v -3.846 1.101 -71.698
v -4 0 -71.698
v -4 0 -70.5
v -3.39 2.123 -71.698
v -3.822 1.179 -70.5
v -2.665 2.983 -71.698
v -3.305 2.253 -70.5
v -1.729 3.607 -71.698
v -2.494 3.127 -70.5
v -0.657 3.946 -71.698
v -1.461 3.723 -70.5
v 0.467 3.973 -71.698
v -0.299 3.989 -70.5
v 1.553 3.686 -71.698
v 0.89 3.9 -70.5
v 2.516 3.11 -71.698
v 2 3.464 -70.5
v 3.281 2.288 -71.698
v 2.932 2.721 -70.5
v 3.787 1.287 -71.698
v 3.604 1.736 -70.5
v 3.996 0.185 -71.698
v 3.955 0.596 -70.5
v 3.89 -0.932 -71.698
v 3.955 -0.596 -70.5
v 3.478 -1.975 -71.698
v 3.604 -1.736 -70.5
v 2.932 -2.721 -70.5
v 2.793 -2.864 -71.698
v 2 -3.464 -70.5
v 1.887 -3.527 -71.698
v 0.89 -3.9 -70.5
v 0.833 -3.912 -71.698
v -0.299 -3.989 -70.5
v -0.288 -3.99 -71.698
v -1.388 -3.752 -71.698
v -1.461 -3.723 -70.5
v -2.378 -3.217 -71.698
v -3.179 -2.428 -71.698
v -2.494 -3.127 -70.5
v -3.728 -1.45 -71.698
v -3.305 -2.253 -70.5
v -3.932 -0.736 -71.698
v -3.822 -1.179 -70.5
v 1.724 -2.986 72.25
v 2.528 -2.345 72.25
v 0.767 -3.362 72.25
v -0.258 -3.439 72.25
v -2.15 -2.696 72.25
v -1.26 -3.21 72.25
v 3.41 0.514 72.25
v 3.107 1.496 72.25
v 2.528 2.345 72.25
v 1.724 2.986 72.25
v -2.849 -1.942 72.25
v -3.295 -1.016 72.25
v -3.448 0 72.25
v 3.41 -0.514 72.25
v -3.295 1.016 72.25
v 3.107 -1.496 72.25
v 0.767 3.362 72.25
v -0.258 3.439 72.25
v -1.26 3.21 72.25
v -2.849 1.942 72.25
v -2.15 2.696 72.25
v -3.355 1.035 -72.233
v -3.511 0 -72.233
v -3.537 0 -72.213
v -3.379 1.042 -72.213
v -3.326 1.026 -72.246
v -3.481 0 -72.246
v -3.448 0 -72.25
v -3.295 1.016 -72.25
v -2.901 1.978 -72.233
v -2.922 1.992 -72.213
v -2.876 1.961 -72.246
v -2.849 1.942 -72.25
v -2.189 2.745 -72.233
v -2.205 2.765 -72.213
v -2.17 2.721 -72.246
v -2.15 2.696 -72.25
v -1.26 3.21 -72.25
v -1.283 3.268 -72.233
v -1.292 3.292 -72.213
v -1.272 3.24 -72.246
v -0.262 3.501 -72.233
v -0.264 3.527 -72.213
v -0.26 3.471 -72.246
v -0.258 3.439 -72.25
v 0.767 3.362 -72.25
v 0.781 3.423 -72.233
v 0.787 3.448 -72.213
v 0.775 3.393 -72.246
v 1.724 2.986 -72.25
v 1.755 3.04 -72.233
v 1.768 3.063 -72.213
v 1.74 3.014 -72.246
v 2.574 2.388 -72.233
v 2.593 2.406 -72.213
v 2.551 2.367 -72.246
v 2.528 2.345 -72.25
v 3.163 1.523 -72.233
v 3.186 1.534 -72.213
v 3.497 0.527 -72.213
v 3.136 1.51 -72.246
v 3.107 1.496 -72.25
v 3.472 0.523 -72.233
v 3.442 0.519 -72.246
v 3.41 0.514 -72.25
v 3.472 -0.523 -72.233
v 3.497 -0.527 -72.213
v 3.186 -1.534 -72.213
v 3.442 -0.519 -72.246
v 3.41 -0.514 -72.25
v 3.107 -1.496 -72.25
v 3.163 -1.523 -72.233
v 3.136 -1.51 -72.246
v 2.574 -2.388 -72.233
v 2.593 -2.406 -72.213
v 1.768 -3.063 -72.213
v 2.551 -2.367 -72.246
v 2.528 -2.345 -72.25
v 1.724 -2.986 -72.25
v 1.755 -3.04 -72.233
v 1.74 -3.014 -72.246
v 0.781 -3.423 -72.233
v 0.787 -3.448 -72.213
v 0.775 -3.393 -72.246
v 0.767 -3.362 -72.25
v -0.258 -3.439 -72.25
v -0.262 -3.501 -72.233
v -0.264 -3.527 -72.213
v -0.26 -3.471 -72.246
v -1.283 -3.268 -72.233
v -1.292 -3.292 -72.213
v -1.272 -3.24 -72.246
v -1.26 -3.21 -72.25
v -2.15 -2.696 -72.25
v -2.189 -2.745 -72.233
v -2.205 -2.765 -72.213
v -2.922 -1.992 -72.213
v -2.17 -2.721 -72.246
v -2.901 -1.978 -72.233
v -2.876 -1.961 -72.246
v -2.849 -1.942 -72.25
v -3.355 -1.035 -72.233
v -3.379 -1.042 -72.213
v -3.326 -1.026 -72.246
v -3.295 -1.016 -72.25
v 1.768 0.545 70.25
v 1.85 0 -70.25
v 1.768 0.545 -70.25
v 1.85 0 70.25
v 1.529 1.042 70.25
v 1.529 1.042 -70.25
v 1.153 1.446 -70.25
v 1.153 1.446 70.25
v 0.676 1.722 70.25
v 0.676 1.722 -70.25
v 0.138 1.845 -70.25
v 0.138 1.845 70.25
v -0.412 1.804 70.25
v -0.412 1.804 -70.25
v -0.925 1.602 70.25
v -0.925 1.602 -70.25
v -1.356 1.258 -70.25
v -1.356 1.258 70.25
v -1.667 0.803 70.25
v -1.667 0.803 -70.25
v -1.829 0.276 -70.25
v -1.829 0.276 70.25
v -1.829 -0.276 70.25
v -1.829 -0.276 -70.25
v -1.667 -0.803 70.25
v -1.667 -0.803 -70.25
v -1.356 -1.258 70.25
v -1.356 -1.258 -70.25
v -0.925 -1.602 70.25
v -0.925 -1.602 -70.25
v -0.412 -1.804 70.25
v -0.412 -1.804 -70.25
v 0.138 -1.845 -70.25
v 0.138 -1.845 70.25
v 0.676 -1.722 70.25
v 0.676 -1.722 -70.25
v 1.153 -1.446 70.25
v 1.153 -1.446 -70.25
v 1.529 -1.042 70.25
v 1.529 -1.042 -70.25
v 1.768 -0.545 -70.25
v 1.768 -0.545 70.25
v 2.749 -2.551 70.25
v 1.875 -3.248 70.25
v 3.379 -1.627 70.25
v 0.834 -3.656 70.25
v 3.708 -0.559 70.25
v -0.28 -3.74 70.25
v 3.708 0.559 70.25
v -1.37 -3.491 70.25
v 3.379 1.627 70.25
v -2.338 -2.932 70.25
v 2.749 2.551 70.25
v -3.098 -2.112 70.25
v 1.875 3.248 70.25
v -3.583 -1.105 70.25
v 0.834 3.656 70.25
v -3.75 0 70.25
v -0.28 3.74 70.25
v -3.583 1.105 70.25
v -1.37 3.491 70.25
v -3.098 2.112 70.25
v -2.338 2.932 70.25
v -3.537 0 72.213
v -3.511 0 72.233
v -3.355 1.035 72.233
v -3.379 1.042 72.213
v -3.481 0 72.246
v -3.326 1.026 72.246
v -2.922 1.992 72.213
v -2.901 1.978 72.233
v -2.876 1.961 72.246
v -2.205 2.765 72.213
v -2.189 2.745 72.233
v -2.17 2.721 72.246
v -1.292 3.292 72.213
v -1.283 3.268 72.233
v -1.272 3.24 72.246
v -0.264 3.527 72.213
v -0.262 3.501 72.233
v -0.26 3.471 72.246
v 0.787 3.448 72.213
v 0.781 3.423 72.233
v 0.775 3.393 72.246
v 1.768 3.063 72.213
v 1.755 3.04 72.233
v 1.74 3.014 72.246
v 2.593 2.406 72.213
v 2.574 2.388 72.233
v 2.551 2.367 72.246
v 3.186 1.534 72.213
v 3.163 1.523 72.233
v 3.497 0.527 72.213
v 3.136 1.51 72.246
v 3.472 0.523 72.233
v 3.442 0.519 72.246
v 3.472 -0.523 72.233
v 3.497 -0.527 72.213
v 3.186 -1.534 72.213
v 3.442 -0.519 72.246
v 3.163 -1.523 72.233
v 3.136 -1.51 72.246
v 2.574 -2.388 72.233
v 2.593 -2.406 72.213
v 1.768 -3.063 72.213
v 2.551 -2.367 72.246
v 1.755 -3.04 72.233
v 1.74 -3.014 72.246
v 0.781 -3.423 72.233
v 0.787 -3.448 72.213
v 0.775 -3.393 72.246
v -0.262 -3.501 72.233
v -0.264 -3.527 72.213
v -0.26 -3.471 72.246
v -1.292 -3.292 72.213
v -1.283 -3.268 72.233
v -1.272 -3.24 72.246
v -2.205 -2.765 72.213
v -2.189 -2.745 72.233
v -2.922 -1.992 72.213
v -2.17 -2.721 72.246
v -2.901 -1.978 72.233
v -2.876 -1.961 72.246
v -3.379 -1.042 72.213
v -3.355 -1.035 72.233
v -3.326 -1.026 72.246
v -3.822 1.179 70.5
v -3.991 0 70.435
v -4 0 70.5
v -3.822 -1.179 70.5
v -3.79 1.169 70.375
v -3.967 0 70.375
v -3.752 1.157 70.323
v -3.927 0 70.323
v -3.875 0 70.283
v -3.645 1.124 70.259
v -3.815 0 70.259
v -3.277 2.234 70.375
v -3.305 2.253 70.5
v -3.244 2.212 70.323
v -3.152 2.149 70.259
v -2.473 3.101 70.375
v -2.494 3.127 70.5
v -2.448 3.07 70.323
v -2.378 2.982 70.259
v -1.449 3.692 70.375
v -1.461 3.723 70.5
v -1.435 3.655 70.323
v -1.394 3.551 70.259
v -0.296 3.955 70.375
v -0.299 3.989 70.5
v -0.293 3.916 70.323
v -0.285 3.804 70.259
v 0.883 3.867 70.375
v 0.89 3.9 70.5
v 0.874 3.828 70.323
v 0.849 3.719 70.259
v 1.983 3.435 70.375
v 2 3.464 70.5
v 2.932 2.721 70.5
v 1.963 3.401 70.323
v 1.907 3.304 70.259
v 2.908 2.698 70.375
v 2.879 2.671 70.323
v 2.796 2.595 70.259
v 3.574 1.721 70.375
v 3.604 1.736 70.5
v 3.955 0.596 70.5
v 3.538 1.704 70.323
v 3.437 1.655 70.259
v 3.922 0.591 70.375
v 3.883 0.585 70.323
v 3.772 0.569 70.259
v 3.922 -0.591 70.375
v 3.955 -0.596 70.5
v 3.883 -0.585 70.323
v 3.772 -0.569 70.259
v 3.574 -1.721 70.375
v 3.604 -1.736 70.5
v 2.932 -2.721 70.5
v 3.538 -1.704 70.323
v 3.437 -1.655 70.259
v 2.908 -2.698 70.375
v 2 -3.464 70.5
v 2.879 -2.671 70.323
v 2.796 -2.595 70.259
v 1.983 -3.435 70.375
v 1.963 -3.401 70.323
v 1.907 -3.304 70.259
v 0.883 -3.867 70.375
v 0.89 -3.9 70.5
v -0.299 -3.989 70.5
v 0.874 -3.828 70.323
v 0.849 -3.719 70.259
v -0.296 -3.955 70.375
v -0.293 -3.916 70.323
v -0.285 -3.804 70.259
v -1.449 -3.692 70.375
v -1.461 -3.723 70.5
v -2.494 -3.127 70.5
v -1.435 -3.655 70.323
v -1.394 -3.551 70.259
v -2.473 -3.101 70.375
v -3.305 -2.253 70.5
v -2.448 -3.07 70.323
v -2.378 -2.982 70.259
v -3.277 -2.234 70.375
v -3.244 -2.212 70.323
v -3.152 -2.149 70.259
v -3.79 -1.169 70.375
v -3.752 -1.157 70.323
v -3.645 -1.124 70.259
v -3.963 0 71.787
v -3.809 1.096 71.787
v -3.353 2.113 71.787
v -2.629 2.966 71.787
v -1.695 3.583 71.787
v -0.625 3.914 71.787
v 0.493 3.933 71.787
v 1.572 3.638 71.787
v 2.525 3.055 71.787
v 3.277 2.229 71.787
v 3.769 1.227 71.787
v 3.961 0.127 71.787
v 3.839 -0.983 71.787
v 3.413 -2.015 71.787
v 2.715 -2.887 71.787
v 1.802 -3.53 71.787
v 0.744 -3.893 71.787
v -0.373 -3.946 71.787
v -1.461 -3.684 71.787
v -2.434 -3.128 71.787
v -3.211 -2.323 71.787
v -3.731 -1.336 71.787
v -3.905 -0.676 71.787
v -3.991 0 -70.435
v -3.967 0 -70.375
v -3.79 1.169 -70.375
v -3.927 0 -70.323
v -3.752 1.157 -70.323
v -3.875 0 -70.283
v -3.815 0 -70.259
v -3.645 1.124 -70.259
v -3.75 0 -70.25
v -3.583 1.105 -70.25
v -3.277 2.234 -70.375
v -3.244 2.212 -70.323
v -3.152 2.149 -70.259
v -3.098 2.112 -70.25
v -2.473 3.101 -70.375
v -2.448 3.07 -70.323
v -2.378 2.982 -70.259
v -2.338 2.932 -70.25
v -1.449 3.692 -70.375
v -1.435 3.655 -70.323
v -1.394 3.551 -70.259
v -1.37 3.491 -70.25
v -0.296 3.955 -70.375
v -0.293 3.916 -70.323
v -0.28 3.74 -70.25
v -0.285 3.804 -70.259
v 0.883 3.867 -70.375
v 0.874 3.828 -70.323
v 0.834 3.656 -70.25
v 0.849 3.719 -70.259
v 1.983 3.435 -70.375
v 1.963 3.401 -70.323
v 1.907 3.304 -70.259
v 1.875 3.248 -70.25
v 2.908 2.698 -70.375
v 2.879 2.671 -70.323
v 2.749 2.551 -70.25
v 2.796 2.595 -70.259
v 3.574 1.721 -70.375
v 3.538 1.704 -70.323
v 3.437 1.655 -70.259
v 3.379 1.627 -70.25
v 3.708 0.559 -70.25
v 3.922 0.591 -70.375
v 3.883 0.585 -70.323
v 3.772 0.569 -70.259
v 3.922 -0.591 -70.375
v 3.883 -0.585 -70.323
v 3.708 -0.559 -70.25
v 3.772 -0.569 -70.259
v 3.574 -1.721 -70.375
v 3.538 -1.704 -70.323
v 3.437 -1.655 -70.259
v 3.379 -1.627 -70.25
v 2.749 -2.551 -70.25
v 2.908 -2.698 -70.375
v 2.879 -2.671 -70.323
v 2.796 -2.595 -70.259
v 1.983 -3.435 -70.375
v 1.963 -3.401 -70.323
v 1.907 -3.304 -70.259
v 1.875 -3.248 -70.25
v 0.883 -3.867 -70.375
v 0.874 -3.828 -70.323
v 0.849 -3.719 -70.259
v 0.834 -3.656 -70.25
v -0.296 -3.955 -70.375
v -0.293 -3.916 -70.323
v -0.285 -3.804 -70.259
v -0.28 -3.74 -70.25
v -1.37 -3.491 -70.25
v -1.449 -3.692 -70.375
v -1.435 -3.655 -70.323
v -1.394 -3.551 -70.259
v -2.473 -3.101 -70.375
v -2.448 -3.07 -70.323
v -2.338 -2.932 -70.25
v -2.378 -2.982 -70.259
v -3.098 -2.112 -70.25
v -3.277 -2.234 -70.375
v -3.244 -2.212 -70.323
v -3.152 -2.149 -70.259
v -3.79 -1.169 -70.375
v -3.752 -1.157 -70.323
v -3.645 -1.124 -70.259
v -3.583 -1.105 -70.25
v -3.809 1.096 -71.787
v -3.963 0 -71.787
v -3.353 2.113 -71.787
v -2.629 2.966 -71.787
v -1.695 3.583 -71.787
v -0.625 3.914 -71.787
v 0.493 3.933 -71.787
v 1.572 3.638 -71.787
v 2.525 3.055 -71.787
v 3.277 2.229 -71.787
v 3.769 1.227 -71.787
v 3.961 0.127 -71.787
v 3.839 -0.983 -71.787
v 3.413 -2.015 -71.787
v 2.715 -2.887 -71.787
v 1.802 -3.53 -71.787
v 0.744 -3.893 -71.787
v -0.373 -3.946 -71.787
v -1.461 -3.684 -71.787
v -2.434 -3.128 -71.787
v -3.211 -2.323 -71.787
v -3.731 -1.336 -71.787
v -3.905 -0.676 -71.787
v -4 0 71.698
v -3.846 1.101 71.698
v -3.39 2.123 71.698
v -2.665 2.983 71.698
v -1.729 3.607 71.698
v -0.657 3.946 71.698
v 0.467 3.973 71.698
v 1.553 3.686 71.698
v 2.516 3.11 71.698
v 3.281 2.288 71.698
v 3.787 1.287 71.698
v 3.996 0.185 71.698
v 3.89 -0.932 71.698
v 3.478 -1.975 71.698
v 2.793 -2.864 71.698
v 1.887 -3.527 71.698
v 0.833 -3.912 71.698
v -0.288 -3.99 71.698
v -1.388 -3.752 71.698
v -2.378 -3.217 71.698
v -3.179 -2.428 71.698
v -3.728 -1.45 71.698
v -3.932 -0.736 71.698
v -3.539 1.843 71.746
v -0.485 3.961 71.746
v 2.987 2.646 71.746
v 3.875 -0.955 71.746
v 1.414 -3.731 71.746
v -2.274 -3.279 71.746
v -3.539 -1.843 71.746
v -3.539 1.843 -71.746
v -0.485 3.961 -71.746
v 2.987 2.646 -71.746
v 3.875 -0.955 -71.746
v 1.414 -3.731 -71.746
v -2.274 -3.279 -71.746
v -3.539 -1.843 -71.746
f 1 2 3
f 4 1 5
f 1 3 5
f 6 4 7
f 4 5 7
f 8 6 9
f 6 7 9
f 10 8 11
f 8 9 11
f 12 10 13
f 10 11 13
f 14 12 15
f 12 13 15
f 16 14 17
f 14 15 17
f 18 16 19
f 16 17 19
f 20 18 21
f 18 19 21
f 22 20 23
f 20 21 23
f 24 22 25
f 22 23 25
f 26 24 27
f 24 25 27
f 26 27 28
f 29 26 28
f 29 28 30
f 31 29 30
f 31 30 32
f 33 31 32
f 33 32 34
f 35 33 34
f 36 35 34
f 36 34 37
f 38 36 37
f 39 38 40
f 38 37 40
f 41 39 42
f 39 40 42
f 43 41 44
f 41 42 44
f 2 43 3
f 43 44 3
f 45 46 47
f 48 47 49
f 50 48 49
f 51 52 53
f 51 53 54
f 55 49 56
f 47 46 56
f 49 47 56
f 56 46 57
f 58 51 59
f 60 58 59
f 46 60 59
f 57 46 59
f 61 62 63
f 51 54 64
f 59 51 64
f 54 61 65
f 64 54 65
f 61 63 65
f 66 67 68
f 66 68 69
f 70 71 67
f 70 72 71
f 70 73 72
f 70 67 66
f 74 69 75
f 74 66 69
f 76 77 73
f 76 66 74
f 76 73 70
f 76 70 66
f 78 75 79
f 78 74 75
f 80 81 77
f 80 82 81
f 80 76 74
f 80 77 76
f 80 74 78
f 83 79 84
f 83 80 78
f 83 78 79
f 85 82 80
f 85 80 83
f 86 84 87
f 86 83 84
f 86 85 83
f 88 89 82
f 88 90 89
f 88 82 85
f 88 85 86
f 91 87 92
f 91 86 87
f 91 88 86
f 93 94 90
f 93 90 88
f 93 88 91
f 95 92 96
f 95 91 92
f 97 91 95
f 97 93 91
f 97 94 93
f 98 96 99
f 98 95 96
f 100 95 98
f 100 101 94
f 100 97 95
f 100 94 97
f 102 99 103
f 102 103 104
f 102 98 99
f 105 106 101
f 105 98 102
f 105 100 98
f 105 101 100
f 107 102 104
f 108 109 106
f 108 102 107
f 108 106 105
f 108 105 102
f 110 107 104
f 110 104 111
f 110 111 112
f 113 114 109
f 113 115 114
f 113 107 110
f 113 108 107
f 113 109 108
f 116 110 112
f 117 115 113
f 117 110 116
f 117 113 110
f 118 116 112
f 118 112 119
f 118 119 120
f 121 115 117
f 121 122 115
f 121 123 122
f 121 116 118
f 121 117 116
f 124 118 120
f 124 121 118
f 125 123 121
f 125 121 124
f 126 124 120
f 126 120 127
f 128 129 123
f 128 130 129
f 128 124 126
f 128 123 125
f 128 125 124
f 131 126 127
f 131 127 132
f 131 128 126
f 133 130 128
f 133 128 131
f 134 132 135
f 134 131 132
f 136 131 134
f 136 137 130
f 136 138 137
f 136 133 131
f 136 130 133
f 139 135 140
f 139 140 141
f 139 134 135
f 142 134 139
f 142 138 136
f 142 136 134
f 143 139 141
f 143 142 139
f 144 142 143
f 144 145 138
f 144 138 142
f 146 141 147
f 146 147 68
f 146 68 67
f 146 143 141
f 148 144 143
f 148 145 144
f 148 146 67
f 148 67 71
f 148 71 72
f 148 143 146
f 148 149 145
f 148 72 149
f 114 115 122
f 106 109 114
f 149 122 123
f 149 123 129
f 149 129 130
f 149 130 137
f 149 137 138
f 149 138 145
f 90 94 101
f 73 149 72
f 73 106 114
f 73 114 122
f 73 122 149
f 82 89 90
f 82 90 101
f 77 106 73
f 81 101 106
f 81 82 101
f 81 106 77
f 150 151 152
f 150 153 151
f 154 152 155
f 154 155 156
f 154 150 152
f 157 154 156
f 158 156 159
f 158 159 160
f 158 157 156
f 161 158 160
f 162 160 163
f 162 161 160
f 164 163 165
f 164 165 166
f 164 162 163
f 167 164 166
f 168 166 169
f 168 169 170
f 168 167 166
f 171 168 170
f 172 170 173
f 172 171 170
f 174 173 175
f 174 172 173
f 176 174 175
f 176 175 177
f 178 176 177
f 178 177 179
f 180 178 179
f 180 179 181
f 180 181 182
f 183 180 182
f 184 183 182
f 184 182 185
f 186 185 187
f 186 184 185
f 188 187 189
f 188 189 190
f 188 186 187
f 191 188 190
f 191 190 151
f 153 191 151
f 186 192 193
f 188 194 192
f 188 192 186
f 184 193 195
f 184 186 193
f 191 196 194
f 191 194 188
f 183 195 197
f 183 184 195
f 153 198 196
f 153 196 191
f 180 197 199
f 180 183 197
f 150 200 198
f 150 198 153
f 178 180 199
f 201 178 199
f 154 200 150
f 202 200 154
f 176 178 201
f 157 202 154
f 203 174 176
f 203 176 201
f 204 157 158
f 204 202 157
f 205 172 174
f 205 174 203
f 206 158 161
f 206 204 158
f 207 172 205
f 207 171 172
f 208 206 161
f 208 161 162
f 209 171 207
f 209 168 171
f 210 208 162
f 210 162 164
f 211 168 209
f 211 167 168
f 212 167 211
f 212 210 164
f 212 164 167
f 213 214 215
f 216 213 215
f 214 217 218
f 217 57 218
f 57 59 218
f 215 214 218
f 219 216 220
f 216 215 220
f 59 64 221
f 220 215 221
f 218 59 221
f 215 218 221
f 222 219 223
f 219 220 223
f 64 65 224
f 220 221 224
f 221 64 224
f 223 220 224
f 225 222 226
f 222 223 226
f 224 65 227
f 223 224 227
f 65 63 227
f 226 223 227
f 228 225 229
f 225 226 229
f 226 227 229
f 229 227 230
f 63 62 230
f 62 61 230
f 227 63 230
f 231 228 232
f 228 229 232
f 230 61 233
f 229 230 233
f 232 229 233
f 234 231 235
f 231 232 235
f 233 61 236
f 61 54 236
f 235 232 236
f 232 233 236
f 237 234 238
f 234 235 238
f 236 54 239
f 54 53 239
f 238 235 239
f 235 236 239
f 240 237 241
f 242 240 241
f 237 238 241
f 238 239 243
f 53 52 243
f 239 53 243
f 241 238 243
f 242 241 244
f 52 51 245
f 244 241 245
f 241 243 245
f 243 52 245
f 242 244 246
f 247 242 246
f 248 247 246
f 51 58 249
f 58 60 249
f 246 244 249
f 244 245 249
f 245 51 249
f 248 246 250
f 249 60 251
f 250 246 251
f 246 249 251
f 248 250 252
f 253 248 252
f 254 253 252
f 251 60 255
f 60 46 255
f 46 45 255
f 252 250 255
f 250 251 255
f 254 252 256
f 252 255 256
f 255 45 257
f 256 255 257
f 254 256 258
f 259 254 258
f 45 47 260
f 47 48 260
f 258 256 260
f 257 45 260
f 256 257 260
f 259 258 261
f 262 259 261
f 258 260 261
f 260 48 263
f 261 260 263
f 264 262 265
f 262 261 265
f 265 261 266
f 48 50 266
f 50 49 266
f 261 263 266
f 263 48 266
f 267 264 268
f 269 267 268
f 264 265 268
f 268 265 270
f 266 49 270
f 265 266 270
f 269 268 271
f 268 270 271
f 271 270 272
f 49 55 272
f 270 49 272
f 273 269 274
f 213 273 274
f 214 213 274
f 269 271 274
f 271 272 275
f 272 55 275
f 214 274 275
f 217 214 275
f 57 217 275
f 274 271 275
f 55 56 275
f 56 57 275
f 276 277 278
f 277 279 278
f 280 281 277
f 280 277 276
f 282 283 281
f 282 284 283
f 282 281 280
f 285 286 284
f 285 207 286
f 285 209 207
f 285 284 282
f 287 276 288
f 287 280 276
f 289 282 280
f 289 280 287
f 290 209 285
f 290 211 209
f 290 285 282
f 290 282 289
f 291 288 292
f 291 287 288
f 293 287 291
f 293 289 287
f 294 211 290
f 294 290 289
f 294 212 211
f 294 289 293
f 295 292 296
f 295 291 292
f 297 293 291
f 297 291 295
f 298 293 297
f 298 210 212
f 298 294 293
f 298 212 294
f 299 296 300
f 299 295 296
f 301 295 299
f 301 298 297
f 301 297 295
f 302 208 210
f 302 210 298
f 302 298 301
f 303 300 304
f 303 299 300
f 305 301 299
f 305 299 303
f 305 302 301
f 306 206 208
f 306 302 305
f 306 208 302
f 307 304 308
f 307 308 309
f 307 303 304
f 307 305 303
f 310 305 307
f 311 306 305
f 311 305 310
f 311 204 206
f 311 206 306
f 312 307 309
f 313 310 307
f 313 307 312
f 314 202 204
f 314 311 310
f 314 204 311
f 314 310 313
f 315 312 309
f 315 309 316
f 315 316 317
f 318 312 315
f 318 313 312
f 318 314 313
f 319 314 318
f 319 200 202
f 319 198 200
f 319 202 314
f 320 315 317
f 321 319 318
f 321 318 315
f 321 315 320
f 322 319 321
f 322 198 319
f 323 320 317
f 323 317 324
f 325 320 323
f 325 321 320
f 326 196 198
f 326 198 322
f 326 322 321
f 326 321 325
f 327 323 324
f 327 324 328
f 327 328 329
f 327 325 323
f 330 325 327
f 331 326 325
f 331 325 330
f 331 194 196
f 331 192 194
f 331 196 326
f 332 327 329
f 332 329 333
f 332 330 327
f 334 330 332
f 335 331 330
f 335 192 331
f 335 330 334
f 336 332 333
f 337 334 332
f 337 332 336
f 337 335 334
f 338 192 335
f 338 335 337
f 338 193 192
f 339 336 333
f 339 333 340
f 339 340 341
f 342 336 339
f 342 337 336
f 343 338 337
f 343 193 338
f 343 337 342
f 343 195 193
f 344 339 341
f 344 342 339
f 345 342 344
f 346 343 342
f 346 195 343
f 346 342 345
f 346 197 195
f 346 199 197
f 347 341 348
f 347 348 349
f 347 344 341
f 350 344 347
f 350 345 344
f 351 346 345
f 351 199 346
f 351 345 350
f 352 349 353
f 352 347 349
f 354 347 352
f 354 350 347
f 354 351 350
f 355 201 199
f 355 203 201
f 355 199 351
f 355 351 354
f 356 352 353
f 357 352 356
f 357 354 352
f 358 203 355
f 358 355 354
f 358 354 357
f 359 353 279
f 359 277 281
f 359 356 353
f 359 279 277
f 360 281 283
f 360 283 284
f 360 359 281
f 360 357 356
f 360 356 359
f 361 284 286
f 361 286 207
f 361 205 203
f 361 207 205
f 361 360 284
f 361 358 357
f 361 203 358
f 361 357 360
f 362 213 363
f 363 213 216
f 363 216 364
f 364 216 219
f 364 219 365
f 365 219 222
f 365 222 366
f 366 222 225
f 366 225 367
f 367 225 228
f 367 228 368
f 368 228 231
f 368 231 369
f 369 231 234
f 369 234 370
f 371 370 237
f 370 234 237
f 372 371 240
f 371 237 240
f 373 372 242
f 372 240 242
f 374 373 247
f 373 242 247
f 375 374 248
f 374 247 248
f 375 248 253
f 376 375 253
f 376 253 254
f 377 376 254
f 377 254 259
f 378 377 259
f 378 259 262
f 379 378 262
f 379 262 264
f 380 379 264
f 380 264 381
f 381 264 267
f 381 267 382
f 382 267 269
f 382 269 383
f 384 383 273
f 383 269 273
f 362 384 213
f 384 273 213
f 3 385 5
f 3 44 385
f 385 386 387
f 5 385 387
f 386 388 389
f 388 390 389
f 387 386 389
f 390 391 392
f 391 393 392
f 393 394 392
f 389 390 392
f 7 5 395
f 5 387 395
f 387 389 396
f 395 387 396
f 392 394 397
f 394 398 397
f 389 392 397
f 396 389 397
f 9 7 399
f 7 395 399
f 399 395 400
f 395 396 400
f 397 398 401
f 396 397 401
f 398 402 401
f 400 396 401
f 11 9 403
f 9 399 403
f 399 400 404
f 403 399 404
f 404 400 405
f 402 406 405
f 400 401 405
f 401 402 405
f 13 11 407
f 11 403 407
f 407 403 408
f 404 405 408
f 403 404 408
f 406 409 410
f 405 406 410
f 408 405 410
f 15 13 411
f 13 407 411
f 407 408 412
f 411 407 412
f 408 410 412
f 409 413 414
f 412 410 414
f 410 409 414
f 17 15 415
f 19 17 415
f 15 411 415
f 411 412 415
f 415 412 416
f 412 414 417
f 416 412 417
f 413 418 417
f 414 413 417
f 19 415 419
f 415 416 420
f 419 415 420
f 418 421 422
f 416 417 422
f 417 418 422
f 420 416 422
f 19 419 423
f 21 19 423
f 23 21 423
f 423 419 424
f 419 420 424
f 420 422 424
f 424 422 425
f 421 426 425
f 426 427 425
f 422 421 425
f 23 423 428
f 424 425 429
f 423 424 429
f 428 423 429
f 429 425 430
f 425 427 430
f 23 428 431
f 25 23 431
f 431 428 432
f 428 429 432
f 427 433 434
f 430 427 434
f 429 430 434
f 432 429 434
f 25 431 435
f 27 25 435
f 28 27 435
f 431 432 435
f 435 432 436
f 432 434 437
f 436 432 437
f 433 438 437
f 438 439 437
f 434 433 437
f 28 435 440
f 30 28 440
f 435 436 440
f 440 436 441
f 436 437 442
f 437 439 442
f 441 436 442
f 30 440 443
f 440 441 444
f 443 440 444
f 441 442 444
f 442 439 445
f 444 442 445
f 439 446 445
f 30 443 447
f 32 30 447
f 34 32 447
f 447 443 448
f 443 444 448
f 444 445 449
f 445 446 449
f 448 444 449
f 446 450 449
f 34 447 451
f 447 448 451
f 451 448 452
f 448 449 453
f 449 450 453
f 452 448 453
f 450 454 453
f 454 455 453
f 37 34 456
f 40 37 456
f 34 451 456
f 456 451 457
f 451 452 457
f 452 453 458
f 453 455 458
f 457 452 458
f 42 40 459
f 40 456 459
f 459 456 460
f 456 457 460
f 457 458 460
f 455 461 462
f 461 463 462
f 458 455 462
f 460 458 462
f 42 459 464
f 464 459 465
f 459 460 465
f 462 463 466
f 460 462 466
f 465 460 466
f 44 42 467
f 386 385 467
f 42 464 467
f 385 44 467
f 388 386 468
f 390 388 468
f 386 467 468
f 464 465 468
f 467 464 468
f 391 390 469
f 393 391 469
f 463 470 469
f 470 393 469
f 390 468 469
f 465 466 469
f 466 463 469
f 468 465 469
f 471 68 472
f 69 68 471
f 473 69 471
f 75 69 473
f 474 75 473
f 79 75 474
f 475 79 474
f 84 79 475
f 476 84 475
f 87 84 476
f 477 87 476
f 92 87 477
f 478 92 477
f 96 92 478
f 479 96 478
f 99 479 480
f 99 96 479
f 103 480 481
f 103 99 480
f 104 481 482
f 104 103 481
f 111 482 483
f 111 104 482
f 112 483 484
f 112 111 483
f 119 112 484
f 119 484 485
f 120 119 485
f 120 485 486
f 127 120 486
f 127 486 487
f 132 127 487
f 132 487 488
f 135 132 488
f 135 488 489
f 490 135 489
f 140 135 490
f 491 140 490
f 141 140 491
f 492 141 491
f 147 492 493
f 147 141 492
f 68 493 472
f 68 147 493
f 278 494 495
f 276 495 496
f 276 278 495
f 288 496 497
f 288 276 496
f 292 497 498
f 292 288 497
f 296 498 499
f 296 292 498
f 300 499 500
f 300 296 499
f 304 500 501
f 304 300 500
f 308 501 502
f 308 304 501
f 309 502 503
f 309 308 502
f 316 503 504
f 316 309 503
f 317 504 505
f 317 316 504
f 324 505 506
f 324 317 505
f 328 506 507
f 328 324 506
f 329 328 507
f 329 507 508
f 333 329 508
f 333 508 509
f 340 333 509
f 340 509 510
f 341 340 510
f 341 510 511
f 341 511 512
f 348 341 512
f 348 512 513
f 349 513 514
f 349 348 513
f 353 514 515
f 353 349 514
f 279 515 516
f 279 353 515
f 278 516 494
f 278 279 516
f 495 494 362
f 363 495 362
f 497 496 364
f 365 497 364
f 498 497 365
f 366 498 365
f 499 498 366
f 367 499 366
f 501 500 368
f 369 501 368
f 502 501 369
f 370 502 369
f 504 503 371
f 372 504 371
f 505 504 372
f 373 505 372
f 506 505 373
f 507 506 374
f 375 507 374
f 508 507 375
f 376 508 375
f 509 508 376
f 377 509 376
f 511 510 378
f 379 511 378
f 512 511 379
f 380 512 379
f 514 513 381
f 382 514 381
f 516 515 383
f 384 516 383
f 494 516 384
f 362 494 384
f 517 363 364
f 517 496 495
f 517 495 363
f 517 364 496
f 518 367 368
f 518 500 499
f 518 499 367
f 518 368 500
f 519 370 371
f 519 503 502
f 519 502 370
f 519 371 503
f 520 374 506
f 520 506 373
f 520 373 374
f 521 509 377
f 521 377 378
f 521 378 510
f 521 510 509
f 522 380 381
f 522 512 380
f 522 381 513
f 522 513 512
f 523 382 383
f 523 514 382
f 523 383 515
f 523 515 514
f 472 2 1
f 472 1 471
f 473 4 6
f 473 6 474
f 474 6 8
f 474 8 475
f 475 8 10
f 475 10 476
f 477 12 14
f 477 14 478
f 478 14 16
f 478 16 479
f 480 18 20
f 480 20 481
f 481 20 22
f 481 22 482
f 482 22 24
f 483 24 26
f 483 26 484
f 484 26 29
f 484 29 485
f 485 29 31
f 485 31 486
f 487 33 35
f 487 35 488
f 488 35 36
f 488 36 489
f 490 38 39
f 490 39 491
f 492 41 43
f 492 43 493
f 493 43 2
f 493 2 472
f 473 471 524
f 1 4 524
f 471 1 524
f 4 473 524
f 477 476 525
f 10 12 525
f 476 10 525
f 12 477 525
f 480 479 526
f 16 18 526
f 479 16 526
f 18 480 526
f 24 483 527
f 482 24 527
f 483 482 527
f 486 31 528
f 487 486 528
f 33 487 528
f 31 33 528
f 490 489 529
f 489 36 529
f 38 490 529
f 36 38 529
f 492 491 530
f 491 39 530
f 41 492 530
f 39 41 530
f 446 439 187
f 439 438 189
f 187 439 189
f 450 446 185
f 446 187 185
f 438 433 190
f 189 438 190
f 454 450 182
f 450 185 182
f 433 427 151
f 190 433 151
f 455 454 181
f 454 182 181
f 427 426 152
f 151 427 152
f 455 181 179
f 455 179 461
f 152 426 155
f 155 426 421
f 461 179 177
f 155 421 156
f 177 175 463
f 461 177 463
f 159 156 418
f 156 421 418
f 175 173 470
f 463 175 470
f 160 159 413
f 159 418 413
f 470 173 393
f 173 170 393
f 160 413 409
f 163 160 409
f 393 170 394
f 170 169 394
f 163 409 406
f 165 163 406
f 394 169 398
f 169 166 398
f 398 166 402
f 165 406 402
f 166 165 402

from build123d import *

# Parameters (mm, degrees)
SKETCH1_R                = 1.85
BOSS_EXTRUDE1_DEPTH      = 70.25
SKETCH2_R                = 4
BOSS_EXTRUDE2_DEPTH      = 2
CHAMFER1_SIZE            = 0.5
FILLET2_R                = 0.25
FILLET3_R                = 0.125
CHAMFER1_OF_MIRROR2_SIZE = 0.5
FILLET2_OF_MIRROR2_R     = 0.25
FILLET3_OF_MIRROR2_R     = 0.125


with BuildPart() as part:
    # Sketch1 → Boss-Extrude1 (new body, symmetric)
    with BuildSketch(Plane.XY):
        Circle(SKETCH1_R)
    extrude(amount=BOSS_EXTRUDE1_DEPTH, both=True)

    # Sketch2 → Boss-Extrude2 (add)
    with BuildSketch(Plane(origin=(0, 0, -70.25), x_dir=(-1, 0, 0), z_dir=(0, 0, -1))):
        Circle(SKETCH2_R)
    boss_extrude2 = extrude(amount=BOSS_EXTRUDE2_DEPTH)

    # Chamfer1
    chamfer1_edges = [part.edges().sort_by_distance(p)[0] for p in [
        (4, 0, -72.25),
    ]]
    chamfer(chamfer1_edges, length=CHAMFER1_SIZE)

    # Fillet2
    fillet2_edges = [part.edges().sort_by_distance(p)[0] for p in [
        (4, 0, -70.25),
    ]]
    fillet(fillet2_edges, radius=FILLET2_R)

    # Fillet3
    fillet3_edges = [part.edges().sort_by_distance(p)[0] for p in [
        (4, 0, -71.75),
        (3.5, 0, -72.25),
    ]]
    fillet(fillet3_edges, radius=FILLET3_R)

    # Mirror2: Boss-Extrude2 across plane
    add(boss_extrude2.mirror(Plane.XY))

    # Chamfer1 of Mirror2
    chamfer1_of_mirror2_edges = [part.edges().sort_by_distance(p)[0] for p in [
        (4, 0, 72.25),
    ]]
    chamfer(chamfer1_of_mirror2_edges, length=CHAMFER1_OF_MIRROR2_SIZE)

    # Fillet2 of Mirror2
    fillet2_of_mirror2_edges = [part.edges().sort_by_distance(p)[0] for p in [
        (4, 0, 70.25),
    ]]
    fillet(fillet2_of_mirror2_edges, radius=FILLET2_OF_MIRROR2_R)

    # Fillet3 of Mirror2
    fillet3_of_mirror2_edges = [part.edges().sort_by_distance(p)[0] for p in [
        (4, 0, 71.75),
        (3.5, 0, 72.25),
    ]]
    fillet(fillet3_of_mirror2_edges, radius=FILLET3_OF_MIRROR2_R)


solid = part.part
